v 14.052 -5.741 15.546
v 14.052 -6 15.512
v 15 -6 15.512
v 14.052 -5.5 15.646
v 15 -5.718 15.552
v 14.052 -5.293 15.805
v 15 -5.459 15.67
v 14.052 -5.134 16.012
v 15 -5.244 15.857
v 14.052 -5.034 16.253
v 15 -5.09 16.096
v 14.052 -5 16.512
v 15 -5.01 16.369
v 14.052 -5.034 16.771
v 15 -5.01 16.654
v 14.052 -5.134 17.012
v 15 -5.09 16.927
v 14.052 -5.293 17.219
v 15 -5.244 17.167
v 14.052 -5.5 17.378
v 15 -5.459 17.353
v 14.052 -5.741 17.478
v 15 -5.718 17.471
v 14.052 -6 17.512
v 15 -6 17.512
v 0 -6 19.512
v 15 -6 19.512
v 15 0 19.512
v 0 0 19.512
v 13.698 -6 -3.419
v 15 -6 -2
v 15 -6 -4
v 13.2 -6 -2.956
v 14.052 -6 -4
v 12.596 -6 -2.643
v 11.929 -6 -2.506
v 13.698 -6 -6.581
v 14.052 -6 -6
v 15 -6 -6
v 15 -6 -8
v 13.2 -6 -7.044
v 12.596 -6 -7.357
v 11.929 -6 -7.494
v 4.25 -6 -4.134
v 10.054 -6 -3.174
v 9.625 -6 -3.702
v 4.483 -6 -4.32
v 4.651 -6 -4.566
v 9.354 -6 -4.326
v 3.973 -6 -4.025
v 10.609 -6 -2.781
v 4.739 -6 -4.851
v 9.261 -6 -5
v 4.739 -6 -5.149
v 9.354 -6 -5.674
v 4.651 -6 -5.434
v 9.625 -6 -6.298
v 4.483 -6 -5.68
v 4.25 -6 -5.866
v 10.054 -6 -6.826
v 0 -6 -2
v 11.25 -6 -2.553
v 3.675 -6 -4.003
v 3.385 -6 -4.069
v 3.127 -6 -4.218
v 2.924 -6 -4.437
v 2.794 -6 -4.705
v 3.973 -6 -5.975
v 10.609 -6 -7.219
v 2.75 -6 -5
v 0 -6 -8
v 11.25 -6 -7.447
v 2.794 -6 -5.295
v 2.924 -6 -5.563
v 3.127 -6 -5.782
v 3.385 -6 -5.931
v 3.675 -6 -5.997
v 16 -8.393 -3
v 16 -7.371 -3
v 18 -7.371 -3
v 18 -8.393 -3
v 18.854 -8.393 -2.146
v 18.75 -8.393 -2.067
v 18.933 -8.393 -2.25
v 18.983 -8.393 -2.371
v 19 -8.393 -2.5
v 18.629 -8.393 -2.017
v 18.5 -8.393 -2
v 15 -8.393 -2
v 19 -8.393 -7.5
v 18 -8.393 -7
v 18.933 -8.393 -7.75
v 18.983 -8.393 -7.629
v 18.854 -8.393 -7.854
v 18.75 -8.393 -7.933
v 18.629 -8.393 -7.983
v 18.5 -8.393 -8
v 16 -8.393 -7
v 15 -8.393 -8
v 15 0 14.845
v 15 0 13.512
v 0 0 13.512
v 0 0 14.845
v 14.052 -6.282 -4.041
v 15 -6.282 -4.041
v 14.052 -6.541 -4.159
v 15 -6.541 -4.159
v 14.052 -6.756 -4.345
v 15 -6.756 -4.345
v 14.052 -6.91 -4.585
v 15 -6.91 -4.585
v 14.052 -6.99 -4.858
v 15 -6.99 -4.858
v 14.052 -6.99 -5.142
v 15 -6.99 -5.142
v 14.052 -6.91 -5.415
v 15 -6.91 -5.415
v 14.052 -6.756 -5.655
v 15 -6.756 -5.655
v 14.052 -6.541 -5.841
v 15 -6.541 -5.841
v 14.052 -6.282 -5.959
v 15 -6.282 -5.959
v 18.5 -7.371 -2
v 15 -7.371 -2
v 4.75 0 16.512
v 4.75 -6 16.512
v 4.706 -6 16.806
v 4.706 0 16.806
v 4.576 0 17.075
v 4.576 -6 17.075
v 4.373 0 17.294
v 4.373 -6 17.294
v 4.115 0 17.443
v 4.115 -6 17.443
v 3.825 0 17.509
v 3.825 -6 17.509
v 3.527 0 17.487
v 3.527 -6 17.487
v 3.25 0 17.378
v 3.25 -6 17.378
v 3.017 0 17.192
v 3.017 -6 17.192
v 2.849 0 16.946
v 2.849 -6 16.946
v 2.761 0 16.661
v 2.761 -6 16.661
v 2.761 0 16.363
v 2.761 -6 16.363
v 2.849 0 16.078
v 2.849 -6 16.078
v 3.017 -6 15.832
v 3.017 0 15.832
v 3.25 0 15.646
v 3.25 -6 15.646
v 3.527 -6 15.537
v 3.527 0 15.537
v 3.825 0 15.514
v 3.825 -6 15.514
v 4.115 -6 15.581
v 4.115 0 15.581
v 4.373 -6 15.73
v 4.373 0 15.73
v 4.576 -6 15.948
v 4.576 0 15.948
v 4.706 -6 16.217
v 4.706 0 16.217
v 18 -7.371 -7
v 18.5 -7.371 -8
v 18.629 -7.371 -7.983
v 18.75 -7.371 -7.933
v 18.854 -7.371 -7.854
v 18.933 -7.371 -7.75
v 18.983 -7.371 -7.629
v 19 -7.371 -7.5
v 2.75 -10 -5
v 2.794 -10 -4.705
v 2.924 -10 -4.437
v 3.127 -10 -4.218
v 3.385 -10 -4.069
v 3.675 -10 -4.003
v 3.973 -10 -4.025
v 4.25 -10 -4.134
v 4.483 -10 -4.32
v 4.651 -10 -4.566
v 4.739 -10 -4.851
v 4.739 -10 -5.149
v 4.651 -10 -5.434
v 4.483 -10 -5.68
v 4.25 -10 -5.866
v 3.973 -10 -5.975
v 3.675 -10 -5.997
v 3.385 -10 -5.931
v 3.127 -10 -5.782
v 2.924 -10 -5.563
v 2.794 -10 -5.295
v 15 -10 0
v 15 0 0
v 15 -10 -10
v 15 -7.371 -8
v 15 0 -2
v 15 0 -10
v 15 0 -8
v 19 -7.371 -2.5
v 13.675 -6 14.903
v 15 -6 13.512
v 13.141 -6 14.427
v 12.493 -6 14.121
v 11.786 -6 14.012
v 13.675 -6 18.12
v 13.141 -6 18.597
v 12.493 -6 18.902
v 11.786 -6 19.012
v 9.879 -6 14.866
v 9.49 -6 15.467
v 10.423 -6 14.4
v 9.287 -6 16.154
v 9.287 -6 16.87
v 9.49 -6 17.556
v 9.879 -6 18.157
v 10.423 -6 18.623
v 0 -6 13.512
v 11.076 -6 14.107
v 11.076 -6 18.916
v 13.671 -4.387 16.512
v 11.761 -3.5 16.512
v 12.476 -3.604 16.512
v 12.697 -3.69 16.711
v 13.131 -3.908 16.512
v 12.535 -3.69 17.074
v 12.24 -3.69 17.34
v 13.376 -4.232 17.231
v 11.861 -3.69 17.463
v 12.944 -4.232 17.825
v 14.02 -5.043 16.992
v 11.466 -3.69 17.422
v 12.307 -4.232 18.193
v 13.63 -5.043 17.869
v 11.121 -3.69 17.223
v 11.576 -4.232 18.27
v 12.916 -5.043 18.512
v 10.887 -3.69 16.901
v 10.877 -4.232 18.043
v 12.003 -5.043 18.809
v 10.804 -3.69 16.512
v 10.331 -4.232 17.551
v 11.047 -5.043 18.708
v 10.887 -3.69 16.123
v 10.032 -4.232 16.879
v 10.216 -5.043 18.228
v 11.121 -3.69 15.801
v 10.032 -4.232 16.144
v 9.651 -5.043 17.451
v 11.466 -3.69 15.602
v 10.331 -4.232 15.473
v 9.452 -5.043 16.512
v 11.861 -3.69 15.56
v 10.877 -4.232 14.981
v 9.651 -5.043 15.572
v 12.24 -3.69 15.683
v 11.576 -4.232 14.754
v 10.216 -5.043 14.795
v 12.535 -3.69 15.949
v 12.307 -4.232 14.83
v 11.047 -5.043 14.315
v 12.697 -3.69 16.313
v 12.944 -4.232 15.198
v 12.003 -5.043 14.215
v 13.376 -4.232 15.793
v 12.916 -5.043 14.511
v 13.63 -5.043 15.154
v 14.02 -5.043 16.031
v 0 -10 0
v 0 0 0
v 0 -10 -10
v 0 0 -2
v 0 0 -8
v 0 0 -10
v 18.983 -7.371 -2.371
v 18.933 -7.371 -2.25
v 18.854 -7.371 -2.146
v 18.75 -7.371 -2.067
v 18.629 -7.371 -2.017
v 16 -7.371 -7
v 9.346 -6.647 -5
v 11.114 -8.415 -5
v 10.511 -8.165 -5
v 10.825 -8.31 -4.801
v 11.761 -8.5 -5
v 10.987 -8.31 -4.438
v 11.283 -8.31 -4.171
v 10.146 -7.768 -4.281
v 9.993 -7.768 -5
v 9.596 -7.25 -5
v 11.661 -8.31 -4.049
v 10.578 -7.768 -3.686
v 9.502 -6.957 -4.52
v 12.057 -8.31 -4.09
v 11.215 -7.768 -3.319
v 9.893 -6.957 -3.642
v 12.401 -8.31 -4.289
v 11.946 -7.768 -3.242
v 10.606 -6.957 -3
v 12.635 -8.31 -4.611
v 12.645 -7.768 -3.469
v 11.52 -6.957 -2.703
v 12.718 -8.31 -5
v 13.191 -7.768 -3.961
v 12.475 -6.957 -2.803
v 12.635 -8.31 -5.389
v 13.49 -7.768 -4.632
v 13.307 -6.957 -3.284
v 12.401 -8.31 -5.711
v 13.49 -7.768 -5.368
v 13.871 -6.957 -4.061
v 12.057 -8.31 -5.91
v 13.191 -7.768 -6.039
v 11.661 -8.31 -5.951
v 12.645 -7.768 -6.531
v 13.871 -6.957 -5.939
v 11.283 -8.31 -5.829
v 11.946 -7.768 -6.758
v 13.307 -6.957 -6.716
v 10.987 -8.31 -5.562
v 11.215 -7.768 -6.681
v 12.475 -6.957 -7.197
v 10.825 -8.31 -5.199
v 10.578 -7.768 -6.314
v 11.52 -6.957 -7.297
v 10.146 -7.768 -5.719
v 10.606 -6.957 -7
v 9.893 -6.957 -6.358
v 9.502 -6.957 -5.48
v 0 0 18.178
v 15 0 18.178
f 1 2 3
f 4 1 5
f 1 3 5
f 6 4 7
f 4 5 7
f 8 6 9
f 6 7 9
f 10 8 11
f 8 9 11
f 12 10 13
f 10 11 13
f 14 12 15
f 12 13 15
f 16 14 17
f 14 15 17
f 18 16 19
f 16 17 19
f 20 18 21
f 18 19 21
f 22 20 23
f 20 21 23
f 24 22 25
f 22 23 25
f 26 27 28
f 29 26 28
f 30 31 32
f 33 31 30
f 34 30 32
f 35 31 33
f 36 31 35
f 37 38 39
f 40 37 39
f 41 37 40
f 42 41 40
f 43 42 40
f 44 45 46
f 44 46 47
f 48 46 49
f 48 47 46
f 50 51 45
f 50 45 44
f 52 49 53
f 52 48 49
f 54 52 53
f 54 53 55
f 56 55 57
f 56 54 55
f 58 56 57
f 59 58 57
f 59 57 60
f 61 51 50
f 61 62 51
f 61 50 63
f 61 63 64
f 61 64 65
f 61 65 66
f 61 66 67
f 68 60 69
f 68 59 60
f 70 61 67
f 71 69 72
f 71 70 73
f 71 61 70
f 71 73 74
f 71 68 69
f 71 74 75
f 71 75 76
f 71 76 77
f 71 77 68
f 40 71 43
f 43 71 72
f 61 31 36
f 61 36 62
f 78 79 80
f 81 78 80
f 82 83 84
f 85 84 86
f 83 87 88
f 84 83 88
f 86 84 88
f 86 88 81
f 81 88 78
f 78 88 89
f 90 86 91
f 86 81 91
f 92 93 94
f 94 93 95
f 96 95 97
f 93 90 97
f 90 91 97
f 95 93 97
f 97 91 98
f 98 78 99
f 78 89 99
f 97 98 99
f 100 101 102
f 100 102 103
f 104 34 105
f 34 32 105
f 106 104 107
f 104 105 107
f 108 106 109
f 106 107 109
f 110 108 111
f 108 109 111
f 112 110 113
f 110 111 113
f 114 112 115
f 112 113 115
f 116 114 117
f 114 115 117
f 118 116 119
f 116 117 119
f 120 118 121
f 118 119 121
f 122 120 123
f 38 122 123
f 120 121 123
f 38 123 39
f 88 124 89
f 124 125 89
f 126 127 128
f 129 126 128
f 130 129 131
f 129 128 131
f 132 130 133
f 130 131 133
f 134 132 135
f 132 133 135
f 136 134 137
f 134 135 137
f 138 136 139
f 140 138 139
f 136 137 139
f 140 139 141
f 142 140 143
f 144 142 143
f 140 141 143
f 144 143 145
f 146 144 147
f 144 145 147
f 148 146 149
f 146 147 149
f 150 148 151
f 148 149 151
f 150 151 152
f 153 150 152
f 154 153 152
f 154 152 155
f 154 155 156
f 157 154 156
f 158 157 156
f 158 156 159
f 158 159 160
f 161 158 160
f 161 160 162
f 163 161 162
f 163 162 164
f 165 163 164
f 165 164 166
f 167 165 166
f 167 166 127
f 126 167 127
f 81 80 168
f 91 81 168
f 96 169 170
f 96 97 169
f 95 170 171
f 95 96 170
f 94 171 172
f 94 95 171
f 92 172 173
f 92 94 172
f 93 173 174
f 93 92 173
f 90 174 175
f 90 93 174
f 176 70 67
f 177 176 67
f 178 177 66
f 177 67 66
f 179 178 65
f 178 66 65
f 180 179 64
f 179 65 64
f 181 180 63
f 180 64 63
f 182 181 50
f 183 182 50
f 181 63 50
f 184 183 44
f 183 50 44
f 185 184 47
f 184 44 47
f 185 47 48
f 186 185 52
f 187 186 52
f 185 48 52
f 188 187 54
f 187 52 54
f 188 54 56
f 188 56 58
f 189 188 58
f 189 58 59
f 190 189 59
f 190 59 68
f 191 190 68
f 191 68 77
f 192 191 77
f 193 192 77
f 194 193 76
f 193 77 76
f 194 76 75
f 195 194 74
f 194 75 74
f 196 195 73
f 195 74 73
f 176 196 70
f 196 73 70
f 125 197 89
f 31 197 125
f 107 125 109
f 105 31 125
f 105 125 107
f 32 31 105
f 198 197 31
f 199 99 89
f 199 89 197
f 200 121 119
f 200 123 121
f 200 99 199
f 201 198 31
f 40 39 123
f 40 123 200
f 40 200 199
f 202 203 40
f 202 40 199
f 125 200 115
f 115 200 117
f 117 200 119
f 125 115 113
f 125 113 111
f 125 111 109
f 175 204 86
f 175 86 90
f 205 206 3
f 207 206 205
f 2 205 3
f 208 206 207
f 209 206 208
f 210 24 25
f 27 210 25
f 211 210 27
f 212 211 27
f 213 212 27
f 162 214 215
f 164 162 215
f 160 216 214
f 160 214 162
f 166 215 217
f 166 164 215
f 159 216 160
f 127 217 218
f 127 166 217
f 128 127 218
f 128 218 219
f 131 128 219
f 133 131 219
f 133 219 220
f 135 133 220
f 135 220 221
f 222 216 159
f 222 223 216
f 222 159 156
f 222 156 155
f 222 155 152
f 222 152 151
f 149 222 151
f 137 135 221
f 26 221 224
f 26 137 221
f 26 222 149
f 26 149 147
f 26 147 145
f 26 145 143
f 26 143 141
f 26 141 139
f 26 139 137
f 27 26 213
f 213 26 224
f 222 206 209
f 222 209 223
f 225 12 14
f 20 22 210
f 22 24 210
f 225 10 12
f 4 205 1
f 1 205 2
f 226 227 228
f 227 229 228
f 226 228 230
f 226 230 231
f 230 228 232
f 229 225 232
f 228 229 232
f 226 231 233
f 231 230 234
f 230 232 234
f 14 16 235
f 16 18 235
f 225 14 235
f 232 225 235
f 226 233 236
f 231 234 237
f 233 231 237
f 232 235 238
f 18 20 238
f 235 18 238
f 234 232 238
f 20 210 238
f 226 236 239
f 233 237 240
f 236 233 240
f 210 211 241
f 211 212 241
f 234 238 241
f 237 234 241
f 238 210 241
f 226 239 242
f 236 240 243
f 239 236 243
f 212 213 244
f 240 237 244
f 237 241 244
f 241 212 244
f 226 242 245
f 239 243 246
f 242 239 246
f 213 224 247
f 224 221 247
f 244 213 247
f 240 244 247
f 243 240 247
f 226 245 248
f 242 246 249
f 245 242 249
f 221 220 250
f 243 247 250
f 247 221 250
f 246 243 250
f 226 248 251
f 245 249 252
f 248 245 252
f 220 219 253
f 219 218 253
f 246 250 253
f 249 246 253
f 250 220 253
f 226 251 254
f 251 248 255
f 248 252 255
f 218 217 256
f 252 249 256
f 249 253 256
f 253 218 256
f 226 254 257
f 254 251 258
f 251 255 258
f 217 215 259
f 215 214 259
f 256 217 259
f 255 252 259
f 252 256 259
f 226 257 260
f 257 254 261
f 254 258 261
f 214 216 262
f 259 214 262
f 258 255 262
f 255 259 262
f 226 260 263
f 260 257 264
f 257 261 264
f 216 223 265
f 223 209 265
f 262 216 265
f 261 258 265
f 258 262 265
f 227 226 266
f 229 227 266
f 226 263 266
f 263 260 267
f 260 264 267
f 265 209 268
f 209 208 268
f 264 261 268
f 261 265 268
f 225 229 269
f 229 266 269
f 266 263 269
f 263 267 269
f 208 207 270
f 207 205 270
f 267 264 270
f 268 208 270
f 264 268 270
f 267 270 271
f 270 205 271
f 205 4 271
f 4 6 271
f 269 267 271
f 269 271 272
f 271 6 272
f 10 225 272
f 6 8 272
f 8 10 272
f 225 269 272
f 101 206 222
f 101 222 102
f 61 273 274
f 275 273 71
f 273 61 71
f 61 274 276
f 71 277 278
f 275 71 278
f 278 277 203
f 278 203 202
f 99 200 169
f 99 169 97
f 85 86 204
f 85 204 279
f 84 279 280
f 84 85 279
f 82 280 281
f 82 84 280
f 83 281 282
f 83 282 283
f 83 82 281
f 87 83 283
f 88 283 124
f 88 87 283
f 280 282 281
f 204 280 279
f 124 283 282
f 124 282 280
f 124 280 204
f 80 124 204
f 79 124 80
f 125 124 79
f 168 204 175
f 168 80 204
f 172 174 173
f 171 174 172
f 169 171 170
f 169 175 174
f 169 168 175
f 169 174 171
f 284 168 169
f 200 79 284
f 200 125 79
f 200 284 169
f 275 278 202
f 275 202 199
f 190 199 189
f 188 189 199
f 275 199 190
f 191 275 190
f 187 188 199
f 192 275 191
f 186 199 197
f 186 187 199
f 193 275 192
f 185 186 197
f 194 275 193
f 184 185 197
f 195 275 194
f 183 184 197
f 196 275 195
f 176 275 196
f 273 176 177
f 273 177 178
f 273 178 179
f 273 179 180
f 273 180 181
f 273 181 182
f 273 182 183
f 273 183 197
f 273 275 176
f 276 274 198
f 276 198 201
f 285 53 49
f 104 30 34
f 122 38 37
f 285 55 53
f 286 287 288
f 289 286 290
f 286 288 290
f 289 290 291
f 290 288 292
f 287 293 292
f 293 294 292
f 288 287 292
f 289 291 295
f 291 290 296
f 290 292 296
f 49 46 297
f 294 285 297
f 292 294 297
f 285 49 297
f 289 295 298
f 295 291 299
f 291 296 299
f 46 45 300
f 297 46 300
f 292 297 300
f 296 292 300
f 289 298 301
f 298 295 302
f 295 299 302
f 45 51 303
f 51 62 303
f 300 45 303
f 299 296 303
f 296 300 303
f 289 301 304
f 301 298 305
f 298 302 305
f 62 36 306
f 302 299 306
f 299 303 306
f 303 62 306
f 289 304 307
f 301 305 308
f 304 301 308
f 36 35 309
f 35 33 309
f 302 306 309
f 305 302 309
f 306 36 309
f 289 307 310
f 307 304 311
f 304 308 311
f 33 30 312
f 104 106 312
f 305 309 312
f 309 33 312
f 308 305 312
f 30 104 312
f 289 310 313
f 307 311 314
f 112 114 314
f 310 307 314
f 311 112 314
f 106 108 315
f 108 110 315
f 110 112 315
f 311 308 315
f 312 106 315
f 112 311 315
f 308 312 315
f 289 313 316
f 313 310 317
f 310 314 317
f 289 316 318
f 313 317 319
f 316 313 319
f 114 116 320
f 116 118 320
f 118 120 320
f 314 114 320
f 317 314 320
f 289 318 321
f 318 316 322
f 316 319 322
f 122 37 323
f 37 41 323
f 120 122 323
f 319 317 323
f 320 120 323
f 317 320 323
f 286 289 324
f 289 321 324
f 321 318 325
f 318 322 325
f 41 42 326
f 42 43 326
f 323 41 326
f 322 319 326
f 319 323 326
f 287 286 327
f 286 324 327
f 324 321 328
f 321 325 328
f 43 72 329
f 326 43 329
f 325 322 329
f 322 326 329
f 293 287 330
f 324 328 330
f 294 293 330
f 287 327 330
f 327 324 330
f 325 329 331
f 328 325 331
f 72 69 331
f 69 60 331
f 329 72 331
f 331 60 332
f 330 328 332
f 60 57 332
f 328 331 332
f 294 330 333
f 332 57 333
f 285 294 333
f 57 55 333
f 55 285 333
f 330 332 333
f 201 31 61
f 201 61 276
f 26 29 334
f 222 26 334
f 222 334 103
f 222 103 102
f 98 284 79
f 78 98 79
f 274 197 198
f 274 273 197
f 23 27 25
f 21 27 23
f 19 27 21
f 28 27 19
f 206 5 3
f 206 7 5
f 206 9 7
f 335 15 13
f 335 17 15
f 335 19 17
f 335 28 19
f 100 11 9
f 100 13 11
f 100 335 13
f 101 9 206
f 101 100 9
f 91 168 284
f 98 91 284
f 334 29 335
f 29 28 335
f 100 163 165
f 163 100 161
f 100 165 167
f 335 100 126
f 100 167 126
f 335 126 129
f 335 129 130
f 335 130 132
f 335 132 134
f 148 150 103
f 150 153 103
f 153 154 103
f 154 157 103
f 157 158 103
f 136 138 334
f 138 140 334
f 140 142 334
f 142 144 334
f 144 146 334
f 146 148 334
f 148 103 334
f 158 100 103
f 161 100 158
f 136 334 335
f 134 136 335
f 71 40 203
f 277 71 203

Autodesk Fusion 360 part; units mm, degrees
sketch "Sketch1" plane through (0, 0, 0) normal (1, 0, 0) x (0, 0, -1)
  line L0 (0, 0) -> (10, 0)
  line L1 (10, 0) -> (10, -10)
  line L2 (10, -10) -> (0, -10)
  line L3 (0, -10) -> (0, 0)
  line L4 (0, 0) -> (10, -10)
  line L5 (0, -10) -> (10, 0)
  line L6 (5, -5) -> (5, 0)
  line L7 (5, 0) -> (10, -10)
  line L8 (6.6667, -3.3333) -> (6.6667, 0)
  line L9 (6.6667, -10) -> (6.6667, -3.3333)
  line L10 (10, 0) -> (6.6667, -10)
  line L11 (8, -6) -> (6.6667, 0)
  line L12 (8, -6) -> (5, -6)
  line L13 (2, -6) -> (3.3333, 0)
  line L14 (2, -6) -> (5, -6)
  dimension "d1" = 10
  dimension "d2" = 10
extrude "Extrude1" add sketch "Sketch1" along normal blind 15 contours L3 L4 L5 L13 L14 | L0 L4 L13 | L2 L4 L5 L9 L12 L14 | L2 L4 L10 | L4 L9 L10 | L0 L5 L11 | L1 L7 L10 | L4 L7 L10 | L4 L9 L10 L12 | L4 L9 L12 | L5 L10 L11 makes body 1
sketch "Sketch2" plane through (0, -6, 0) normal (0, 1, 0) x (-1, 0, 0)
  line L0 (0, -8) -> (0, -2)
  line L1 (0, -2) -> (-15, -2)
  line L2 (-15, -2) -> (-15, -8)
  line L3 (-15, -8) -> (0, -8)
  line L4 (-15, -2) -> (0, -2)
  line L5 (0, -2) -> (0, -8)
  line L6 (0, -8) -> (-15, -8)
  line L7 (-15, -8) -> (-15, -2)
  line L8 (-15, -2) -> (0, -8)
  line L9 (-15, -8) -> (0, -2)
  line L10 (-7.5, -5) -> (0, -5)
  circle A0 centre (-3.75, -5) radius 1
  dimension "d5" = 2
extrude "Extrude2" cut sketch "Sketch2" against normal blind 10 contours L10 A0 | L10 A0 bodies 1
sketch "Sketch3" plane through (0, -6, 0) normal (0, 1, 0) x (-1, 0, 0)
  circle A0 centre (-3.75, -5) radius 1
  line L0 (0, -8) -> (0, -2)
  line L1 (0, -2) -> (-15, -2)
  line L2 (-15, -2) -> (-15, -8)
  line L3 (-15, -8) -> (0, -8)
  line L4 (-3.75, -5) -> (-15, -5)
  circle A1 centre (-11.7612, -5) radius 2.5
  dimension "d8" = 5
sphere "SpherePrimitive1" cut diameter 5 placed x (-1, 0, 0) y (0, 0, 1) z (0, 1, 0) at (11.7612, -6, -5) bodies 1
sketch "Sketch4" plane through (0, 0, 0) normal (1, 0, 0) x (0, 0, -1)
  line L0 (0, 0) -> (-11.5117, 0)
  line L1 (-11.5117, 0) -> (-21.5117, 0)
  line L2 (-21.5117, 0) -> (-21.5117, -10)
  line L3 (-21.5117, -10) -> (-11.5117, -10)
  line L4 (-11.5117, -10) -> (-11.5117, 0)
  line L5 (-16.5117, -5) -> (-16.5117, 0)
  line L6 (-18.1783, -3.3333) -> (-18.1783, 0)
  line L7 (4.9359, -6.009) -> (-27.7076, -6.009)
  line L8 (-16.5117, -5) -> (-21.5117, -5)
  line L9 (10, -10) -> (0, -10)
  line L10 (7.5, -6) -> (2.5, -6)
  line L11 (-19.0117, -10) -> (-19.0117, -6)
  line L12 (-21.5117, 0) -> (-18.1783, 0)
  line L13 (-21.5117, -5.9998) -> (-19.5117, -5.9998)
  line L14 (-19.5117, -5.9998) -> (-18.1783, 0)
  line L15 (-13.5117, -5.9998) -> (-14.845, 0)
  line L16 (-37.9592, -6.009) -> (-5.3157, -6.009)
  line L17 (-13.5117, -5.9998) -> (-19.5117, -5.9998)
  line L18 (-13.5117, -5.9998) -> (-19.5117, -5.9998)
  dimension "d10" = 10
  dimension "d11" = 10
  dimension "d12" = 4
  dimension "d13" = 4
  dimension "d14" = 2
extrude "Extrude3" add sketch "Sketch4" along normal blind 15 separate body contours L1 L5 L8 L14 L15 L17 L18 | L1 L5 L8 L14 makes body 2
sketch "Sketch5" plane through (0, -5.9998, 0) normal (0, -1, 0) x (1, 0, 0)
  line L0 (0, 19.5117) -> (0, 13.5117)
  line L1 (0, 13.5117) -> (15, 13.5117)
  line L2 (15, 13.5117) -> (15, 19.5117)
  line L3 (15, 19.5117) -> (0, 19.5117)
  line L4 (0, 19.5117) -> (15, 13.5117)
  line L5 (0, 16.5117) -> (15, 16.5117)
  line L6 (0, -8) -> (0, -2)
  line L7 (0, 16.5117) -> (3.75, 16.5117)
  circle A0 centre (3.75, 16.5117) radius 1
  line L8 (11.7612, -5) -> (11.7612, 16.5117)
  point P0 (3.75, -5)
  point P1 (11.7612, -5)
  point P2 (15, -5)
  dimension "d17" = 3.75
  dimension "d18" = 3.2388
  dimension "d19" = 3.75
  dimension "d20" = 2
extrude "Extrude4" cut sketch "Sketch5" against normal blind 15 contours L5 L7 A0 | L5 L7 A0 bodies 2
sketch "Sketch6" plane through (0, -5.9998, 0) normal (0, -1, 0) x (1, 0, 0)
  circle A0 centre (3.75, 16.5117) radius 1
  line L0 (0, 19.5117) -> (0, 13.5117)
  line L1 (0, 13.5117) -> (15, 13.5117)
  line L2 (15, 13.5117) -> (15, 19.5117)
  line L3 (15, 19.5117) -> (0, 19.5117)
  line L4 (15, -2) -> (15, -8)
  line L5 (11.7612, -5) -> (11.7612, 19.5117)
  line L6 (3.75, 16.5117) -> (15, 16.5117)
  circle A1 centre (11.7612, 16.5117) radius 2.5
  point P0 (11.7612, -5)
  dimension "d23" = 3.2388
  dimension "d24" = 5
sphere "SpherePrimitive2" cut diameter 5 placed x (1, 0, 0) y (0, 0, 1) z (0, -1, 0) at (11.7612, -5.9998, 16.5117) bodies 2
sketch "Sketch7" plane through (15, 0, 0) normal (1, 0, 0) x (0, 0, -1)
  line L0 (8, -6) -> (2, -6)
  line L1 (2, -6) -> (3.3333, 0)
  line L2 (3.3333, 0) -> (0, 0)
  line L3 (0, 0) -> (0, -10)
  line L4 (0, -10) -> (10, -10)
  line L5 (10, -10) -> (10, 0)
  line L6 (10, 0) -> (6.6667, 0)
  line L7 (6.6667, 0) -> (8, -6)
  circle A0 centre (5, -6) radius 1
  dimension "d26" = 2
extrude "Extrude5" cut sketch "Sketch7" against normal blind 1 contours L0 A0 picked at (5.3333, -6.4534) bodies 1
sketch "Sketch8" plane through (15, 0, 0) normal (1, 0, 0) x (0, 0, -1)
  arc A0 (4, -6) -> (6, -6) centre (5, -6) ccw
  line L0 (4, -6) -> (2, -6)
  line L1 (2, -6) -> (3.3333, 0)
  line L2 (3.3333, 0) -> (0, 0)
  line L3 (0, 0) -> (0, -10)
  line L4 (0, -10) -> (10, -10)
  line L5 (10, -10) -> (10, 0)
  line L6 (10, 0) -> (6.6667, 0)
  line L7 (6.6667, 0) -> (8, -6)
  line L8 (8, -6) -> (6, -6)
  line L9 (2, -6) -> (2, 0)
  line L10 (8, -6) -> (8, 0)
  line L11 (2, 0) -> (3.3333, 0)
  line L12 (2, -6) -> (3.3333, 0)
  line L13 (6.6667, 0) -> (8, -6)
  line L14 (6.6667, 0) -> (8, 0)
extrude "Extrude6" cut sketch "Sketch8" against normal blind 15 contours L1 L2 L9 L11 L12 | L6 L7 L10 L13 L14 bodies 1
sketch "Sketch9" plane through (15, 0, 0) normal (1, 0, 0) x (0, 0, -1)
  line L0 (-14.845, 0) -> (-18.1783, 0)
  line L1 (-18.1783, 0) -> (-19.5117, -5.9998)
  line L2 (-19.5117, -5.9998) -> (-13.5117, -5.9998)
  line L3 (-13.5117, -5.9998) -> (-14.845, 0)
  line L4 (-13.5117, -5.9998) -> (-13.5117, 0.0002)
  line L5 (-19.5117, -5.9998) -> (-19.5117, 0.0002)
  line L6 (-19.5117, 0.0002) -> (-18.1783, 0)
  line L7 (-19.5117, -5.9998) -> (-18.1783, 0)
  line L8 (-13.5117, 0.0002) -> (-14.845, 0)
  line L9 (-14.845, 0) -> (-13.5117, -5.9998)
  dimension "d31" = 6
  dimension "d32" = 6
extrude "Extrude7" add sketch "Sketch9" against normal blind 15 contours L3 L4 L8 L9 | L1 L5 L6 L7 bodies 2
sketch "Sketch10" plane through (15, 0, 0) normal (1, 0, 0) x (0, 0, -1)
  line L0 (-14.845, 0) -> (-18.1783, 0)
  line L1 (-18.1783, 0) -> (-19.5117, 0.0002)
  line L2 (-19.5117, 0.0002) -> (-19.5117, -5.9998)
  line L3 (-19.5117, -5.9998) -> (-13.5117, -5.9998)
  line L4 (-13.5117, -5.9998) -> (-13.5117, 0.0002)
  line L5 (-13.5117, 0.0002) -> (-14.845, 0)
  circle A0 centre (-16.5117, -5.9998) radius 1
  dimension "d35" = 2
extrude "Extrude8" cut sketch "Sketch10" against normal blind 1 contours L3 A0 picked at (-16.4375, -5.6748) bodies 2
sketch "Sketch11" plane through (15, 0, 0) normal (1, 0, 0) x (0, 0, -1)
  line L0 (2, -6) -> (2, 0)
  line L1 (2, 0) -> (0, 0)
  line L2 (0, 0) -> (0, -10)
  line L3 (0, -10) -> (10, -10)
  line L4 (10, -10) -> (10, 0)
  line L5 (10, 0) -> (8, 0)
  line L6 (8, 0) -> (8, -6)
  line L7 (8, -6) -> (6, -6)
  arc A0 (4, -6) -> (6, -6) centre (5, -6) ccw
  line L8 (4, -6) -> (2, -6)
  line L9 (4, -6) -> (4, -10)
  line L10 (5, -7) -> (5, -7.2252)
  line L11 (5, -7.2252) -> (5, -10)
  line L12 (2, -6) -> (2, -10)
  line L13 (8, -6) -> (8, -10)
  line L14 (2, -7.3711) -> (8, -7.3711)
  line L15 (2, -8.393) -> (8, -8.393)
extrude "Extrude9" add sketch "Sketch11" along normal blind 4 contours L9 L12 L14 L15 | L9 L11 L14 L15 | L11 L13 L14 L15 bodies 1
sketch "Sketch12" plane through (0, -7.3711, 0) normal (0, 1, 0) x (-1, 0, 0)
  line L0 (-15, -8) -> (-15, -2)
  line L1 (-15, -2) -> (-19, -2)
  line L2 (-19, -2) -> (-19, -8)
  line L3 (-19, -8) -> (-15, -8)
  line L4 (-16, -3) -> (-18, -3)
  line L5 (-18, -3) -> (-18, -7)
  line L6 (-18, -7) -> (-16, -7)
  line L7 (-16, -7) -> (-16, -3)
  dimension "d40" = -1
extrude "Extrude10" cut sketch "Sketch12" against normal blind 2 contours L4 L5 L6 L7 bodies 1
fillet "Fillet1" radius 0.5 1 edges at (19, -7.882, -8) on bodies 1
fillet "Fillet2" radius 0.5 1 edges at (19, -7.882, -2) on bodies 1
